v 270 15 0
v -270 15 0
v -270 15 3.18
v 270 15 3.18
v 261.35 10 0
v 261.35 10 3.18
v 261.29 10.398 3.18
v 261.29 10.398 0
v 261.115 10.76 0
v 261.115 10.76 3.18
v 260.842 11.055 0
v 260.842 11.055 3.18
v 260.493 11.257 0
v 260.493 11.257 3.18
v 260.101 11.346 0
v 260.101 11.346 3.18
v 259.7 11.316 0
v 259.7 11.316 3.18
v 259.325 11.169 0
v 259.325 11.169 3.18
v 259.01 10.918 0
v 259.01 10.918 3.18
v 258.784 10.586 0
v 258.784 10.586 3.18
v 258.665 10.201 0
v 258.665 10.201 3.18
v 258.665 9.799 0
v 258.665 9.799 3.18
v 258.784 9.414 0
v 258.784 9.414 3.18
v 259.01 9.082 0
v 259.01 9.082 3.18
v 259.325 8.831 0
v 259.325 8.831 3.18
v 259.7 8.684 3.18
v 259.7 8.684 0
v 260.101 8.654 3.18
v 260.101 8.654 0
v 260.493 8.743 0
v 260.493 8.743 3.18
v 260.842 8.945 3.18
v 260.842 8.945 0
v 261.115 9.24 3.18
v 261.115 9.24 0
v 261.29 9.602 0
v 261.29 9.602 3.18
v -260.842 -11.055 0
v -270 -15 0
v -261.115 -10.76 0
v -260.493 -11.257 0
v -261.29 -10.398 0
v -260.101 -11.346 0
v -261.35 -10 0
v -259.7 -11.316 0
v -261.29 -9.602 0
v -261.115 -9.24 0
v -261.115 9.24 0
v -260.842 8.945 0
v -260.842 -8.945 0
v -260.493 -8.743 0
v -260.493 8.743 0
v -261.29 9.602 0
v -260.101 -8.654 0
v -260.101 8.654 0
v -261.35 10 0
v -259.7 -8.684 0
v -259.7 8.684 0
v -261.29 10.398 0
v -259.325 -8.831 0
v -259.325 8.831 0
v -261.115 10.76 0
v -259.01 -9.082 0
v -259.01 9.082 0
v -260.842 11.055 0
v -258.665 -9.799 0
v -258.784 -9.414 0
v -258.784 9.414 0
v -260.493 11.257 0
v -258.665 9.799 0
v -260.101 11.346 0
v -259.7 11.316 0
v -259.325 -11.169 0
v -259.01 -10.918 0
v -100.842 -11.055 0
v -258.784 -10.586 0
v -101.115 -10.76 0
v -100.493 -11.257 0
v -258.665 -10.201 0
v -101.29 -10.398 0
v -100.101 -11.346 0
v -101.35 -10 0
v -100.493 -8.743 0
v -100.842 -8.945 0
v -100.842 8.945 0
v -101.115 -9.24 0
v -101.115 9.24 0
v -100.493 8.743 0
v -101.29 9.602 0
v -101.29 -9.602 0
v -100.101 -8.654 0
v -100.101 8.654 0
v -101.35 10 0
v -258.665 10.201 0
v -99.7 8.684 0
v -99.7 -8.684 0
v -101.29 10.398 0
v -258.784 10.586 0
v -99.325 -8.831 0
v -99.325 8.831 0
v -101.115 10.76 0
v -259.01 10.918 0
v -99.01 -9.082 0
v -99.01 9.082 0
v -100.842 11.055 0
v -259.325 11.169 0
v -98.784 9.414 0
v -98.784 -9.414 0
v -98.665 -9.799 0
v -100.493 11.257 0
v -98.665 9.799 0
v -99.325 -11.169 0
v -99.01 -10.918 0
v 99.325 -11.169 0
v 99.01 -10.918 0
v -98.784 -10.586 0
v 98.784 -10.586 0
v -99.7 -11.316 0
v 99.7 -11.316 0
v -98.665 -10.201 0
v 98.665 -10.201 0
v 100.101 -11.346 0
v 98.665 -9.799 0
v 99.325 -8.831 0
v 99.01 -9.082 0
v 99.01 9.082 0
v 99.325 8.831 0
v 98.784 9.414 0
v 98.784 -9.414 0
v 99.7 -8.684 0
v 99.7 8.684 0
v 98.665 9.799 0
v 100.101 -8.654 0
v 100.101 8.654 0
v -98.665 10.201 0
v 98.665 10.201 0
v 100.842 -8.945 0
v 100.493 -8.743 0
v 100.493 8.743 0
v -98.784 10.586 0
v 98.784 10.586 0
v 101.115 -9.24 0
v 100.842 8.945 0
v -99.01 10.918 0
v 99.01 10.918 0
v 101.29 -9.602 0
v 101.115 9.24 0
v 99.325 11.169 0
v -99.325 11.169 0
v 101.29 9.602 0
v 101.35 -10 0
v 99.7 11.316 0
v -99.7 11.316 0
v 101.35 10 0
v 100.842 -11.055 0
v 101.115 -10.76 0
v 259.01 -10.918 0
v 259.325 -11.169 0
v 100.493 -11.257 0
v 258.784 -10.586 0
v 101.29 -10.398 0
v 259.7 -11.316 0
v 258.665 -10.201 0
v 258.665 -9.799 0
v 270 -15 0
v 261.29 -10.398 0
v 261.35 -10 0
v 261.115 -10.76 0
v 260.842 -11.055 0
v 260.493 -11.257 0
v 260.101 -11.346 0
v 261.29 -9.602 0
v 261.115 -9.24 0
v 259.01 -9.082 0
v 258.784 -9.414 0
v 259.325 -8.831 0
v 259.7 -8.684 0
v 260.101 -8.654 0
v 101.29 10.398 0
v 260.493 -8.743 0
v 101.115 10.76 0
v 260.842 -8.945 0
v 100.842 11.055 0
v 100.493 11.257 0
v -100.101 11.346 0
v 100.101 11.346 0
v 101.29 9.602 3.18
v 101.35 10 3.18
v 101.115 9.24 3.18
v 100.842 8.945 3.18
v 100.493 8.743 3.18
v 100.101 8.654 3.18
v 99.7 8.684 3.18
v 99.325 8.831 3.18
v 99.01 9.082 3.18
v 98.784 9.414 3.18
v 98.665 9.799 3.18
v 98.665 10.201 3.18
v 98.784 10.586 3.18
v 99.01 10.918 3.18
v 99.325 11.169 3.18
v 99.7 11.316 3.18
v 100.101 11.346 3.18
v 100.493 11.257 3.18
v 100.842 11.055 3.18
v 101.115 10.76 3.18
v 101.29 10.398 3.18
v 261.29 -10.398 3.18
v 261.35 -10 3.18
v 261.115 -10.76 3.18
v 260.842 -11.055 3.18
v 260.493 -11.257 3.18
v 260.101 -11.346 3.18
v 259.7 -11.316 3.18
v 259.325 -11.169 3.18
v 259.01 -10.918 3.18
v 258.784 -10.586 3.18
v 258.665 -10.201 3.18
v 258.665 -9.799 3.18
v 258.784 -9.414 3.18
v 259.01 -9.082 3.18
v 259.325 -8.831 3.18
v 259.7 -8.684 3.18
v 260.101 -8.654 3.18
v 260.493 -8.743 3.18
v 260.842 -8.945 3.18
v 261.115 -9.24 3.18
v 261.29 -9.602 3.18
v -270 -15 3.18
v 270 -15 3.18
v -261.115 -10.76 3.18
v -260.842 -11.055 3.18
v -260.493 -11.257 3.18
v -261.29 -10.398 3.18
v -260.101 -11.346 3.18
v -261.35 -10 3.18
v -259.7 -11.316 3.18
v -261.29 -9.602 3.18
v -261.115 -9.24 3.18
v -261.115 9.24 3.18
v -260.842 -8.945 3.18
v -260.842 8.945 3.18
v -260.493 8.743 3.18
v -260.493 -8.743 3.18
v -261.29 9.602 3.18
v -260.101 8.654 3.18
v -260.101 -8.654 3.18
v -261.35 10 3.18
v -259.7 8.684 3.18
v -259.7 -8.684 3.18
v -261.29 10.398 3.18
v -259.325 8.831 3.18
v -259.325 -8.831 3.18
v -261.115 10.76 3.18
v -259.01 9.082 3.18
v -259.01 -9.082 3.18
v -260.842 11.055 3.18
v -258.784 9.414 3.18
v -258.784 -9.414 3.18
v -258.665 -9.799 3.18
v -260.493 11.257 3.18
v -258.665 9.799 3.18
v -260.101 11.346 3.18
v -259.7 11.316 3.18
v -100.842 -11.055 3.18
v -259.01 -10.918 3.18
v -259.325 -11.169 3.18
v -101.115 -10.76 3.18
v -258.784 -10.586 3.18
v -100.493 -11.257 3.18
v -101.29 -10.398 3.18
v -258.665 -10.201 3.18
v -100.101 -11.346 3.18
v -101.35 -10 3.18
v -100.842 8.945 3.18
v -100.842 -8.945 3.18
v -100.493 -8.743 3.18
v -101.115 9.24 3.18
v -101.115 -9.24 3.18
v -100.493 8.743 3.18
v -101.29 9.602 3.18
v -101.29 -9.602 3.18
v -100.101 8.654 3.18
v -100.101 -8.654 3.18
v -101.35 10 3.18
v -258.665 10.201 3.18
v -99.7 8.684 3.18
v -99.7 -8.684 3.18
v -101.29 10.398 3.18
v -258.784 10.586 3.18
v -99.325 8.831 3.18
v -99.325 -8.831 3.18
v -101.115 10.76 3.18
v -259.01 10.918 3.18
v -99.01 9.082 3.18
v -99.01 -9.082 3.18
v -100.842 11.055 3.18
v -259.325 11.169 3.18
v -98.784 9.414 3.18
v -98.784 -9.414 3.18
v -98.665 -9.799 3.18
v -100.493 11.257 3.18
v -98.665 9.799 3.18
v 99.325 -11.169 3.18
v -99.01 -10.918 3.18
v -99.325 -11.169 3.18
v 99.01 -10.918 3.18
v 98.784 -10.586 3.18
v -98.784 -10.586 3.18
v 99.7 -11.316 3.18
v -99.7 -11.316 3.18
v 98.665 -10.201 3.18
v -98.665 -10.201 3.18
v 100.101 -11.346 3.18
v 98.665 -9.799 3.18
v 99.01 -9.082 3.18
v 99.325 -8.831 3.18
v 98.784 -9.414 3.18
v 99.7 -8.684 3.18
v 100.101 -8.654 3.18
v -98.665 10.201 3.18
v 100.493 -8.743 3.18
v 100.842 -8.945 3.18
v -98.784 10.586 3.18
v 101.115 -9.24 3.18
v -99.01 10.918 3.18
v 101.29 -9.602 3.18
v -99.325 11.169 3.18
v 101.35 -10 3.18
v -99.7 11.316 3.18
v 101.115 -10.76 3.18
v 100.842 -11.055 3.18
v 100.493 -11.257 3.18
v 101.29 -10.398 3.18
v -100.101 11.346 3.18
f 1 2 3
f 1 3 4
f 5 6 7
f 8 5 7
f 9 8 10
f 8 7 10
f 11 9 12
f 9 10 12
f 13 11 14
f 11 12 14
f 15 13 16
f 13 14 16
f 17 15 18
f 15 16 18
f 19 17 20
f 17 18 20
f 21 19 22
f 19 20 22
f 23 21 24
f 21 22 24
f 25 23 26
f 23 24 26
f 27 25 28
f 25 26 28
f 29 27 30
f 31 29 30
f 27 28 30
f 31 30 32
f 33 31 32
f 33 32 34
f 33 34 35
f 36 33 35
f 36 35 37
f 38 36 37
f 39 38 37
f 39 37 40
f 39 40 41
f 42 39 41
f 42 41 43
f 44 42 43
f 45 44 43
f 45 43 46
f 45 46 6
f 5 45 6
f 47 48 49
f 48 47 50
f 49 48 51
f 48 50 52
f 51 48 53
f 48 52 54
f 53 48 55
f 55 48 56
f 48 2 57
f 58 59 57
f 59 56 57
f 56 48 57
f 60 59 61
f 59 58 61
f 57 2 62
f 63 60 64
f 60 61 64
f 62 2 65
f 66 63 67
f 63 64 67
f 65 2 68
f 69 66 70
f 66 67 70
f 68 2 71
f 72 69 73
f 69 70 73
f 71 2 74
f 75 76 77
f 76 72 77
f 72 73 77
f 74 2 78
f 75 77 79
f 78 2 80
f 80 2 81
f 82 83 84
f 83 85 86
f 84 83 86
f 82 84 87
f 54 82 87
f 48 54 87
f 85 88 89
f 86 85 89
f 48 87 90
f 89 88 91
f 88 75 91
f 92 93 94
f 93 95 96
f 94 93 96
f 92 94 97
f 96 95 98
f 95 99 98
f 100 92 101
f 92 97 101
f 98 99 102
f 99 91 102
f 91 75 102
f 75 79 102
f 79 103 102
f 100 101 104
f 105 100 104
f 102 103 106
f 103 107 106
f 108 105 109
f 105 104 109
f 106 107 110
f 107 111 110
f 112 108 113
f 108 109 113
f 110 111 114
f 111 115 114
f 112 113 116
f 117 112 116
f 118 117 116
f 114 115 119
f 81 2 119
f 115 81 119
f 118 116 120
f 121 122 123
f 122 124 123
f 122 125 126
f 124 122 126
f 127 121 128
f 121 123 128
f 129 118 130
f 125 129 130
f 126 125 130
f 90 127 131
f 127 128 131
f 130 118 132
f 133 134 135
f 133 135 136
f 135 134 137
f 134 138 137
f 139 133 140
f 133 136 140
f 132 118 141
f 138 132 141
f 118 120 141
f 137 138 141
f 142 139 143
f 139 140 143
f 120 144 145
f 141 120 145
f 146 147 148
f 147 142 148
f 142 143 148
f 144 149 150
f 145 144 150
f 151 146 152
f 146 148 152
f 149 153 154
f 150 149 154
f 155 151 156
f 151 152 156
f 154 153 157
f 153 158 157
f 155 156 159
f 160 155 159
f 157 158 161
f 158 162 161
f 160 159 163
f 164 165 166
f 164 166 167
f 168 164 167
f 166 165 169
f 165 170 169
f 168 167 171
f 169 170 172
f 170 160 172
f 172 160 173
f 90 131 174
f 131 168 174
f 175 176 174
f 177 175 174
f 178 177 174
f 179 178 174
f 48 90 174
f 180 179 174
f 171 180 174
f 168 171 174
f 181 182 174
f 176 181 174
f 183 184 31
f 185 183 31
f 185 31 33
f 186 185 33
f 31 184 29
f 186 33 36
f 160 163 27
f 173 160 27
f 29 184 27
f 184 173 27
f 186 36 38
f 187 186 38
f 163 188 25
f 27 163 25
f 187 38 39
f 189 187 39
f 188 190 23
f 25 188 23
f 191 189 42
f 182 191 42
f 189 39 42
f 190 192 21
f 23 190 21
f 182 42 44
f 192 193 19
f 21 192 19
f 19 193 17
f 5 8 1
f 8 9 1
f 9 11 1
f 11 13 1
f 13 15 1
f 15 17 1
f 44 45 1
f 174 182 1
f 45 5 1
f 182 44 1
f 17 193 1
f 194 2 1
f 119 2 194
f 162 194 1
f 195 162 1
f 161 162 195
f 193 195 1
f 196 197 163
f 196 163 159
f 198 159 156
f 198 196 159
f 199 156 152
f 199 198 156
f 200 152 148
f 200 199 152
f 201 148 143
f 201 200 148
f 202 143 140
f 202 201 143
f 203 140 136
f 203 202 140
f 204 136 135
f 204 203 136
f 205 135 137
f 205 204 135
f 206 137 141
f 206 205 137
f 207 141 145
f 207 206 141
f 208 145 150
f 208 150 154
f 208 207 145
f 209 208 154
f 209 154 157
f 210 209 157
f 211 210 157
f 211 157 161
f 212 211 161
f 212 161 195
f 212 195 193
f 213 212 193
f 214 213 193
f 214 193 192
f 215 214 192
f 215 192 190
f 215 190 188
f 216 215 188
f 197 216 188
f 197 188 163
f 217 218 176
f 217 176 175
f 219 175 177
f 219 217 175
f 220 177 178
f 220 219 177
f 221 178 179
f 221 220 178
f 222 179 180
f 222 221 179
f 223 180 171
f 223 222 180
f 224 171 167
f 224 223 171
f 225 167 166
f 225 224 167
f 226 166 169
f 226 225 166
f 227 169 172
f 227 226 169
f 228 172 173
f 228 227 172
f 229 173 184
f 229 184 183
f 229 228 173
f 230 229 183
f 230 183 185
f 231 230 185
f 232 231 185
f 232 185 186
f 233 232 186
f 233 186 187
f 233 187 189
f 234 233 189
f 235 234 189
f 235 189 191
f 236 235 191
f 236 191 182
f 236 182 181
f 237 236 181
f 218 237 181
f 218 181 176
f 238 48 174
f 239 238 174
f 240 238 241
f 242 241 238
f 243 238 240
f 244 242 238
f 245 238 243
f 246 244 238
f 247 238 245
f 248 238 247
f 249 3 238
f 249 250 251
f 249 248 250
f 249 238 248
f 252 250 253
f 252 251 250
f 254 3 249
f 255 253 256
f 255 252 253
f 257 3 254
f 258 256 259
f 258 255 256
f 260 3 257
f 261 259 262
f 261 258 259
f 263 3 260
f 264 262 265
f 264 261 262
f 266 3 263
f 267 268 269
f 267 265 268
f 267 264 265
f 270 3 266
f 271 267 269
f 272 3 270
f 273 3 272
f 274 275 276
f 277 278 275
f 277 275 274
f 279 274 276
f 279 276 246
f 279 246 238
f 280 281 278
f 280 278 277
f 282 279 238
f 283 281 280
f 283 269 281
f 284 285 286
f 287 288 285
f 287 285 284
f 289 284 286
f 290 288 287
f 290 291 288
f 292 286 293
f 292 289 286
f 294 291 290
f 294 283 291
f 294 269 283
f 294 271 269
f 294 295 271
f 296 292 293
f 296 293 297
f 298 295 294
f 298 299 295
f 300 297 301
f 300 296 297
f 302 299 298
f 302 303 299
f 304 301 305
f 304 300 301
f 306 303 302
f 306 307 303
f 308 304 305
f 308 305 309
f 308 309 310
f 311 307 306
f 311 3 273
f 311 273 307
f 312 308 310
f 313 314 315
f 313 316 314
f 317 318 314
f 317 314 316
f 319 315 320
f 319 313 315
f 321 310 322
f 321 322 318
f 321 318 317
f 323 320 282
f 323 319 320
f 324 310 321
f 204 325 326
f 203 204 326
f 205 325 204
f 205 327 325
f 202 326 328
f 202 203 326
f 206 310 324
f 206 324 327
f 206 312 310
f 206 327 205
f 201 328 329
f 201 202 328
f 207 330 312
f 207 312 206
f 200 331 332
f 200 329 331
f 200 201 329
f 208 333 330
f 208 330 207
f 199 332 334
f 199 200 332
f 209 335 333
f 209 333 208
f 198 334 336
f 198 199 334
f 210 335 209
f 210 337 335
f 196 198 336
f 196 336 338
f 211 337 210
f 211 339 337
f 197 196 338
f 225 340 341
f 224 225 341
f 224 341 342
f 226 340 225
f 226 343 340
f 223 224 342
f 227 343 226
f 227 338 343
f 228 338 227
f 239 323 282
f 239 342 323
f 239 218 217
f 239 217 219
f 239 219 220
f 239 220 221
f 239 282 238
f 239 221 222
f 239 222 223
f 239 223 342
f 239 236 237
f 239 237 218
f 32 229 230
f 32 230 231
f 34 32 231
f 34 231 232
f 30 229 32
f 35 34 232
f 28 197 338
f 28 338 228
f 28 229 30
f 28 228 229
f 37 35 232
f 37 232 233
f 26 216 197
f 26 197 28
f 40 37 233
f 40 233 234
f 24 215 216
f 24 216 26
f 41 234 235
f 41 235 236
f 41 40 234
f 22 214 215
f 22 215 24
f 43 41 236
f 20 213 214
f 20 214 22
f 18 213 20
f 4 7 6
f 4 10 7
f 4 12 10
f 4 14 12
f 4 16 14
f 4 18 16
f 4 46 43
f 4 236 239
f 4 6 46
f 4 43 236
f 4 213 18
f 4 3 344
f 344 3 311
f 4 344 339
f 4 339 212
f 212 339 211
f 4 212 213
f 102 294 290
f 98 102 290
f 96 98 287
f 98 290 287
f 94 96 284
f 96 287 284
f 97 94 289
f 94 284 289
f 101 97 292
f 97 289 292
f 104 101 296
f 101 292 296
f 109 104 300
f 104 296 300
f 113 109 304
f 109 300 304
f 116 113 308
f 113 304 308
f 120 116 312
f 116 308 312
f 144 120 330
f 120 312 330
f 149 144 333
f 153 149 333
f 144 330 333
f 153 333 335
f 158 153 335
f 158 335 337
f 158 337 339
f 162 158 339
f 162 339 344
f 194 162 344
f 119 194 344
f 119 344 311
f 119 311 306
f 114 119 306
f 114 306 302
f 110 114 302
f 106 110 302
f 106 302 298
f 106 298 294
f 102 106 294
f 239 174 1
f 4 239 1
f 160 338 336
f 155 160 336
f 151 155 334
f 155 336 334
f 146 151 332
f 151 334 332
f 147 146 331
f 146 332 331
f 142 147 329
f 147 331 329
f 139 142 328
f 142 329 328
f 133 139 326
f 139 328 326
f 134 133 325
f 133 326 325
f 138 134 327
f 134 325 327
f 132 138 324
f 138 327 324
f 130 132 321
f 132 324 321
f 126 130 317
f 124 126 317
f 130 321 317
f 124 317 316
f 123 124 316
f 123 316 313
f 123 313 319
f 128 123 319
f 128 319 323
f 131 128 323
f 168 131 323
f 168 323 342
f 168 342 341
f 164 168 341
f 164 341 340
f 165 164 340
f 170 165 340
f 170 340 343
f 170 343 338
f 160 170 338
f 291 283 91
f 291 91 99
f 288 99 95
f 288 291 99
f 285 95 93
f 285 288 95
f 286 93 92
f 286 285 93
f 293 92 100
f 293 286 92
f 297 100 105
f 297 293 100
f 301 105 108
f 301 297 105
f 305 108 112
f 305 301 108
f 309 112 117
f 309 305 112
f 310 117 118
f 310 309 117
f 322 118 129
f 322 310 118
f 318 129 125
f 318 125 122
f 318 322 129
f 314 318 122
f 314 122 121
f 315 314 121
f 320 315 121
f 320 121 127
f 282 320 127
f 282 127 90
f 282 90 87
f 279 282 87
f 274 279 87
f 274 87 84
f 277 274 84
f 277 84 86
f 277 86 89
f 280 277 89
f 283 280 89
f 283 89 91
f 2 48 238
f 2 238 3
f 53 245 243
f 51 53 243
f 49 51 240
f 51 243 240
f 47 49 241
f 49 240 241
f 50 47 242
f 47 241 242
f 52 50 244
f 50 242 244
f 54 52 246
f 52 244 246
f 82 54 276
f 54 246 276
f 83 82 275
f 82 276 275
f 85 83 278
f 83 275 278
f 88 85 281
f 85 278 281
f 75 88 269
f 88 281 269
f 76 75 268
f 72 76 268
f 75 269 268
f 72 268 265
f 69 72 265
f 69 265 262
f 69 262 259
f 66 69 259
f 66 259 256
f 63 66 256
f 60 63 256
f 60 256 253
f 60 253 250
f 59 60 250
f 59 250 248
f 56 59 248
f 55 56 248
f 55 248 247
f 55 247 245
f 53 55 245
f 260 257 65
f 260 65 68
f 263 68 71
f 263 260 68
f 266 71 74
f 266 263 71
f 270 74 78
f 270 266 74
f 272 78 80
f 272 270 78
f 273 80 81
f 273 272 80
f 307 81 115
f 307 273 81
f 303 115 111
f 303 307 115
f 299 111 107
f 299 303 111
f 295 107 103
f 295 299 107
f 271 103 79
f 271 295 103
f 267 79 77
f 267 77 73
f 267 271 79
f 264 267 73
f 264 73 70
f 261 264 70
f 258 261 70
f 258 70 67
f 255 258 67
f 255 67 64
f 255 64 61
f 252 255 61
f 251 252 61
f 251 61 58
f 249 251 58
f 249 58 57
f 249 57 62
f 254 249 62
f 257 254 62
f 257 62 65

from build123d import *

# Parameters (mm, degrees)
SKETCH3_W               = 540
SKETCH3_H               = 30
BOSS_EXTRUDE3_DEPTH     = 3.18
CUT_EXTRUDE1_REACH      = 272.435
SKETCH4_R               = 1.35
MIRROR2_COPY_1_REACH    = 272.435
MIRROR2_COPY_1_SKETCH_R = 1.35
CUT_EXTRUDE2_REACH      = 272.435
SKETCH5_R               = 1.35
MIRROR4_COPY_1_REACH    = 272.435
MIRROR4_COPY_1_SKETCH_R = 1.35


with BuildPart() as part:
    # Sketch3 → Boss-Extrude3 (new body)
    with BuildSketch(Plane.XY):
        Rectangle(SKETCH3_W, SKETCH3_H)
    extrude(amount=BOSS_EXTRUDE3_DEPTH)

    # Sketch4 → Cut-Extrude1 (cut, up to next)
    with BuildSketch(Plane.XY.offset(3.18), mode=Mode.PRIVATE) as cut_extrude1_sk1:
        with Locations((260, 10)):
            Circle(SKETCH4_R)
    cut_extrude1_tool1 = extrude(cut_extrude1_sk1.sketch, amount=-CUT_EXTRUDE1_REACH, mode=Mode.PRIVATE) & part.part
    cut_extrude1 = cut_extrude1_tool1.solids().sort_by_distance((260, 10, 3.18))[0]
    add(cut_extrude1, mode=Mode.SUBTRACT)

    # Mirror1: Cut-Extrude1 across plane
    add(cut_extrude1.mirror(Plane.ZX), mode=Mode.SUBTRACT)

    # Mirror2: Cut-Extrude1 across plane
    add(cut_extrude1.mirror(Plane(origin=(0, 0, 0), x_dir=(0, 0, 1), z_dir=(1, 0, 0))), mode=Mode.SUBTRACT)

    # Mirror2 copy 1 sketch → Mirror2 copy 1 (cut, up to next)
    with BuildSketch(Plane(origin=(0, 0, 3.18), x_dir=(-1, 0, 0), z_dir=(0, 0, 1)), mode=Mode.PRIVATE) as mirror2_copy_1_sk1:
        with Locations((260, 10)):
            Circle(MIRROR2_COPY_1_SKETCH_R)
    mirror2_copy_1_tool1 = extrude(mirror2_copy_1_sk1.sketch, amount=-MIRROR2_COPY_1_REACH, mode=Mode.PRIVATE) & part.part
    add(mirror2_copy_1_tool1.solids().sort_by_distance((-260, -10, 3.18))[0], mode=Mode.SUBTRACT)

    # Sketch5 → Cut-Extrude2 (cut, up to next)
    with BuildSketch(Plane.XY.offset(3.18), mode=Mode.PRIVATE) as cut_extrude2_sk1:
        with Locations((100, -10)):
            Circle(SKETCH5_R)
    cut_extrude2_tool1 = extrude(cut_extrude2_sk1.sketch, amount=-CUT_EXTRUDE2_REACH, mode=Mode.PRIVATE) & part.part
    cut_extrude2 = cut_extrude2_tool1.solids().sort_by_distance((100, -10, 3.18))[0]
    add(cut_extrude2, mode=Mode.SUBTRACT)

    # Mirror3: Cut-Extrude2 across plane
    add(cut_extrude2.mirror(Plane(origin=(0, 0, 0), x_dir=(0, 0, 1), z_dir=(1, 0, 0))), mode=Mode.SUBTRACT)

    # Mirror4: Cut-Extrude2 across plane
    add(cut_extrude2.mirror(Plane.ZX), mode=Mode.SUBTRACT)

    # Mirror4 copy 1 sketch → Mirror4 copy 1 (cut, up to next)
    with BuildSketch(Plane(origin=(0, 0, 3.18), x_dir=(-1, 0, 0), z_dir=(0, 0, 1)), mode=Mode.PRIVATE) as mirror4_copy_1_sk1:
        with Locations((100, -10)):
            Circle(MIRROR4_COPY_1_SKETCH_R)
    mirror4_copy_1_tool1 = extrude(mirror4_copy_1_sk1.sketch, amount=-MIRROR4_COPY_1_REACH, mode=Mode.PRIVATE) & part.part
    add(mirror4_copy_1_tool1.solids().sort_by_distance((-100, 10, 3.18))[0], mode=Mode.SUBTRACT)


solid = part.part
